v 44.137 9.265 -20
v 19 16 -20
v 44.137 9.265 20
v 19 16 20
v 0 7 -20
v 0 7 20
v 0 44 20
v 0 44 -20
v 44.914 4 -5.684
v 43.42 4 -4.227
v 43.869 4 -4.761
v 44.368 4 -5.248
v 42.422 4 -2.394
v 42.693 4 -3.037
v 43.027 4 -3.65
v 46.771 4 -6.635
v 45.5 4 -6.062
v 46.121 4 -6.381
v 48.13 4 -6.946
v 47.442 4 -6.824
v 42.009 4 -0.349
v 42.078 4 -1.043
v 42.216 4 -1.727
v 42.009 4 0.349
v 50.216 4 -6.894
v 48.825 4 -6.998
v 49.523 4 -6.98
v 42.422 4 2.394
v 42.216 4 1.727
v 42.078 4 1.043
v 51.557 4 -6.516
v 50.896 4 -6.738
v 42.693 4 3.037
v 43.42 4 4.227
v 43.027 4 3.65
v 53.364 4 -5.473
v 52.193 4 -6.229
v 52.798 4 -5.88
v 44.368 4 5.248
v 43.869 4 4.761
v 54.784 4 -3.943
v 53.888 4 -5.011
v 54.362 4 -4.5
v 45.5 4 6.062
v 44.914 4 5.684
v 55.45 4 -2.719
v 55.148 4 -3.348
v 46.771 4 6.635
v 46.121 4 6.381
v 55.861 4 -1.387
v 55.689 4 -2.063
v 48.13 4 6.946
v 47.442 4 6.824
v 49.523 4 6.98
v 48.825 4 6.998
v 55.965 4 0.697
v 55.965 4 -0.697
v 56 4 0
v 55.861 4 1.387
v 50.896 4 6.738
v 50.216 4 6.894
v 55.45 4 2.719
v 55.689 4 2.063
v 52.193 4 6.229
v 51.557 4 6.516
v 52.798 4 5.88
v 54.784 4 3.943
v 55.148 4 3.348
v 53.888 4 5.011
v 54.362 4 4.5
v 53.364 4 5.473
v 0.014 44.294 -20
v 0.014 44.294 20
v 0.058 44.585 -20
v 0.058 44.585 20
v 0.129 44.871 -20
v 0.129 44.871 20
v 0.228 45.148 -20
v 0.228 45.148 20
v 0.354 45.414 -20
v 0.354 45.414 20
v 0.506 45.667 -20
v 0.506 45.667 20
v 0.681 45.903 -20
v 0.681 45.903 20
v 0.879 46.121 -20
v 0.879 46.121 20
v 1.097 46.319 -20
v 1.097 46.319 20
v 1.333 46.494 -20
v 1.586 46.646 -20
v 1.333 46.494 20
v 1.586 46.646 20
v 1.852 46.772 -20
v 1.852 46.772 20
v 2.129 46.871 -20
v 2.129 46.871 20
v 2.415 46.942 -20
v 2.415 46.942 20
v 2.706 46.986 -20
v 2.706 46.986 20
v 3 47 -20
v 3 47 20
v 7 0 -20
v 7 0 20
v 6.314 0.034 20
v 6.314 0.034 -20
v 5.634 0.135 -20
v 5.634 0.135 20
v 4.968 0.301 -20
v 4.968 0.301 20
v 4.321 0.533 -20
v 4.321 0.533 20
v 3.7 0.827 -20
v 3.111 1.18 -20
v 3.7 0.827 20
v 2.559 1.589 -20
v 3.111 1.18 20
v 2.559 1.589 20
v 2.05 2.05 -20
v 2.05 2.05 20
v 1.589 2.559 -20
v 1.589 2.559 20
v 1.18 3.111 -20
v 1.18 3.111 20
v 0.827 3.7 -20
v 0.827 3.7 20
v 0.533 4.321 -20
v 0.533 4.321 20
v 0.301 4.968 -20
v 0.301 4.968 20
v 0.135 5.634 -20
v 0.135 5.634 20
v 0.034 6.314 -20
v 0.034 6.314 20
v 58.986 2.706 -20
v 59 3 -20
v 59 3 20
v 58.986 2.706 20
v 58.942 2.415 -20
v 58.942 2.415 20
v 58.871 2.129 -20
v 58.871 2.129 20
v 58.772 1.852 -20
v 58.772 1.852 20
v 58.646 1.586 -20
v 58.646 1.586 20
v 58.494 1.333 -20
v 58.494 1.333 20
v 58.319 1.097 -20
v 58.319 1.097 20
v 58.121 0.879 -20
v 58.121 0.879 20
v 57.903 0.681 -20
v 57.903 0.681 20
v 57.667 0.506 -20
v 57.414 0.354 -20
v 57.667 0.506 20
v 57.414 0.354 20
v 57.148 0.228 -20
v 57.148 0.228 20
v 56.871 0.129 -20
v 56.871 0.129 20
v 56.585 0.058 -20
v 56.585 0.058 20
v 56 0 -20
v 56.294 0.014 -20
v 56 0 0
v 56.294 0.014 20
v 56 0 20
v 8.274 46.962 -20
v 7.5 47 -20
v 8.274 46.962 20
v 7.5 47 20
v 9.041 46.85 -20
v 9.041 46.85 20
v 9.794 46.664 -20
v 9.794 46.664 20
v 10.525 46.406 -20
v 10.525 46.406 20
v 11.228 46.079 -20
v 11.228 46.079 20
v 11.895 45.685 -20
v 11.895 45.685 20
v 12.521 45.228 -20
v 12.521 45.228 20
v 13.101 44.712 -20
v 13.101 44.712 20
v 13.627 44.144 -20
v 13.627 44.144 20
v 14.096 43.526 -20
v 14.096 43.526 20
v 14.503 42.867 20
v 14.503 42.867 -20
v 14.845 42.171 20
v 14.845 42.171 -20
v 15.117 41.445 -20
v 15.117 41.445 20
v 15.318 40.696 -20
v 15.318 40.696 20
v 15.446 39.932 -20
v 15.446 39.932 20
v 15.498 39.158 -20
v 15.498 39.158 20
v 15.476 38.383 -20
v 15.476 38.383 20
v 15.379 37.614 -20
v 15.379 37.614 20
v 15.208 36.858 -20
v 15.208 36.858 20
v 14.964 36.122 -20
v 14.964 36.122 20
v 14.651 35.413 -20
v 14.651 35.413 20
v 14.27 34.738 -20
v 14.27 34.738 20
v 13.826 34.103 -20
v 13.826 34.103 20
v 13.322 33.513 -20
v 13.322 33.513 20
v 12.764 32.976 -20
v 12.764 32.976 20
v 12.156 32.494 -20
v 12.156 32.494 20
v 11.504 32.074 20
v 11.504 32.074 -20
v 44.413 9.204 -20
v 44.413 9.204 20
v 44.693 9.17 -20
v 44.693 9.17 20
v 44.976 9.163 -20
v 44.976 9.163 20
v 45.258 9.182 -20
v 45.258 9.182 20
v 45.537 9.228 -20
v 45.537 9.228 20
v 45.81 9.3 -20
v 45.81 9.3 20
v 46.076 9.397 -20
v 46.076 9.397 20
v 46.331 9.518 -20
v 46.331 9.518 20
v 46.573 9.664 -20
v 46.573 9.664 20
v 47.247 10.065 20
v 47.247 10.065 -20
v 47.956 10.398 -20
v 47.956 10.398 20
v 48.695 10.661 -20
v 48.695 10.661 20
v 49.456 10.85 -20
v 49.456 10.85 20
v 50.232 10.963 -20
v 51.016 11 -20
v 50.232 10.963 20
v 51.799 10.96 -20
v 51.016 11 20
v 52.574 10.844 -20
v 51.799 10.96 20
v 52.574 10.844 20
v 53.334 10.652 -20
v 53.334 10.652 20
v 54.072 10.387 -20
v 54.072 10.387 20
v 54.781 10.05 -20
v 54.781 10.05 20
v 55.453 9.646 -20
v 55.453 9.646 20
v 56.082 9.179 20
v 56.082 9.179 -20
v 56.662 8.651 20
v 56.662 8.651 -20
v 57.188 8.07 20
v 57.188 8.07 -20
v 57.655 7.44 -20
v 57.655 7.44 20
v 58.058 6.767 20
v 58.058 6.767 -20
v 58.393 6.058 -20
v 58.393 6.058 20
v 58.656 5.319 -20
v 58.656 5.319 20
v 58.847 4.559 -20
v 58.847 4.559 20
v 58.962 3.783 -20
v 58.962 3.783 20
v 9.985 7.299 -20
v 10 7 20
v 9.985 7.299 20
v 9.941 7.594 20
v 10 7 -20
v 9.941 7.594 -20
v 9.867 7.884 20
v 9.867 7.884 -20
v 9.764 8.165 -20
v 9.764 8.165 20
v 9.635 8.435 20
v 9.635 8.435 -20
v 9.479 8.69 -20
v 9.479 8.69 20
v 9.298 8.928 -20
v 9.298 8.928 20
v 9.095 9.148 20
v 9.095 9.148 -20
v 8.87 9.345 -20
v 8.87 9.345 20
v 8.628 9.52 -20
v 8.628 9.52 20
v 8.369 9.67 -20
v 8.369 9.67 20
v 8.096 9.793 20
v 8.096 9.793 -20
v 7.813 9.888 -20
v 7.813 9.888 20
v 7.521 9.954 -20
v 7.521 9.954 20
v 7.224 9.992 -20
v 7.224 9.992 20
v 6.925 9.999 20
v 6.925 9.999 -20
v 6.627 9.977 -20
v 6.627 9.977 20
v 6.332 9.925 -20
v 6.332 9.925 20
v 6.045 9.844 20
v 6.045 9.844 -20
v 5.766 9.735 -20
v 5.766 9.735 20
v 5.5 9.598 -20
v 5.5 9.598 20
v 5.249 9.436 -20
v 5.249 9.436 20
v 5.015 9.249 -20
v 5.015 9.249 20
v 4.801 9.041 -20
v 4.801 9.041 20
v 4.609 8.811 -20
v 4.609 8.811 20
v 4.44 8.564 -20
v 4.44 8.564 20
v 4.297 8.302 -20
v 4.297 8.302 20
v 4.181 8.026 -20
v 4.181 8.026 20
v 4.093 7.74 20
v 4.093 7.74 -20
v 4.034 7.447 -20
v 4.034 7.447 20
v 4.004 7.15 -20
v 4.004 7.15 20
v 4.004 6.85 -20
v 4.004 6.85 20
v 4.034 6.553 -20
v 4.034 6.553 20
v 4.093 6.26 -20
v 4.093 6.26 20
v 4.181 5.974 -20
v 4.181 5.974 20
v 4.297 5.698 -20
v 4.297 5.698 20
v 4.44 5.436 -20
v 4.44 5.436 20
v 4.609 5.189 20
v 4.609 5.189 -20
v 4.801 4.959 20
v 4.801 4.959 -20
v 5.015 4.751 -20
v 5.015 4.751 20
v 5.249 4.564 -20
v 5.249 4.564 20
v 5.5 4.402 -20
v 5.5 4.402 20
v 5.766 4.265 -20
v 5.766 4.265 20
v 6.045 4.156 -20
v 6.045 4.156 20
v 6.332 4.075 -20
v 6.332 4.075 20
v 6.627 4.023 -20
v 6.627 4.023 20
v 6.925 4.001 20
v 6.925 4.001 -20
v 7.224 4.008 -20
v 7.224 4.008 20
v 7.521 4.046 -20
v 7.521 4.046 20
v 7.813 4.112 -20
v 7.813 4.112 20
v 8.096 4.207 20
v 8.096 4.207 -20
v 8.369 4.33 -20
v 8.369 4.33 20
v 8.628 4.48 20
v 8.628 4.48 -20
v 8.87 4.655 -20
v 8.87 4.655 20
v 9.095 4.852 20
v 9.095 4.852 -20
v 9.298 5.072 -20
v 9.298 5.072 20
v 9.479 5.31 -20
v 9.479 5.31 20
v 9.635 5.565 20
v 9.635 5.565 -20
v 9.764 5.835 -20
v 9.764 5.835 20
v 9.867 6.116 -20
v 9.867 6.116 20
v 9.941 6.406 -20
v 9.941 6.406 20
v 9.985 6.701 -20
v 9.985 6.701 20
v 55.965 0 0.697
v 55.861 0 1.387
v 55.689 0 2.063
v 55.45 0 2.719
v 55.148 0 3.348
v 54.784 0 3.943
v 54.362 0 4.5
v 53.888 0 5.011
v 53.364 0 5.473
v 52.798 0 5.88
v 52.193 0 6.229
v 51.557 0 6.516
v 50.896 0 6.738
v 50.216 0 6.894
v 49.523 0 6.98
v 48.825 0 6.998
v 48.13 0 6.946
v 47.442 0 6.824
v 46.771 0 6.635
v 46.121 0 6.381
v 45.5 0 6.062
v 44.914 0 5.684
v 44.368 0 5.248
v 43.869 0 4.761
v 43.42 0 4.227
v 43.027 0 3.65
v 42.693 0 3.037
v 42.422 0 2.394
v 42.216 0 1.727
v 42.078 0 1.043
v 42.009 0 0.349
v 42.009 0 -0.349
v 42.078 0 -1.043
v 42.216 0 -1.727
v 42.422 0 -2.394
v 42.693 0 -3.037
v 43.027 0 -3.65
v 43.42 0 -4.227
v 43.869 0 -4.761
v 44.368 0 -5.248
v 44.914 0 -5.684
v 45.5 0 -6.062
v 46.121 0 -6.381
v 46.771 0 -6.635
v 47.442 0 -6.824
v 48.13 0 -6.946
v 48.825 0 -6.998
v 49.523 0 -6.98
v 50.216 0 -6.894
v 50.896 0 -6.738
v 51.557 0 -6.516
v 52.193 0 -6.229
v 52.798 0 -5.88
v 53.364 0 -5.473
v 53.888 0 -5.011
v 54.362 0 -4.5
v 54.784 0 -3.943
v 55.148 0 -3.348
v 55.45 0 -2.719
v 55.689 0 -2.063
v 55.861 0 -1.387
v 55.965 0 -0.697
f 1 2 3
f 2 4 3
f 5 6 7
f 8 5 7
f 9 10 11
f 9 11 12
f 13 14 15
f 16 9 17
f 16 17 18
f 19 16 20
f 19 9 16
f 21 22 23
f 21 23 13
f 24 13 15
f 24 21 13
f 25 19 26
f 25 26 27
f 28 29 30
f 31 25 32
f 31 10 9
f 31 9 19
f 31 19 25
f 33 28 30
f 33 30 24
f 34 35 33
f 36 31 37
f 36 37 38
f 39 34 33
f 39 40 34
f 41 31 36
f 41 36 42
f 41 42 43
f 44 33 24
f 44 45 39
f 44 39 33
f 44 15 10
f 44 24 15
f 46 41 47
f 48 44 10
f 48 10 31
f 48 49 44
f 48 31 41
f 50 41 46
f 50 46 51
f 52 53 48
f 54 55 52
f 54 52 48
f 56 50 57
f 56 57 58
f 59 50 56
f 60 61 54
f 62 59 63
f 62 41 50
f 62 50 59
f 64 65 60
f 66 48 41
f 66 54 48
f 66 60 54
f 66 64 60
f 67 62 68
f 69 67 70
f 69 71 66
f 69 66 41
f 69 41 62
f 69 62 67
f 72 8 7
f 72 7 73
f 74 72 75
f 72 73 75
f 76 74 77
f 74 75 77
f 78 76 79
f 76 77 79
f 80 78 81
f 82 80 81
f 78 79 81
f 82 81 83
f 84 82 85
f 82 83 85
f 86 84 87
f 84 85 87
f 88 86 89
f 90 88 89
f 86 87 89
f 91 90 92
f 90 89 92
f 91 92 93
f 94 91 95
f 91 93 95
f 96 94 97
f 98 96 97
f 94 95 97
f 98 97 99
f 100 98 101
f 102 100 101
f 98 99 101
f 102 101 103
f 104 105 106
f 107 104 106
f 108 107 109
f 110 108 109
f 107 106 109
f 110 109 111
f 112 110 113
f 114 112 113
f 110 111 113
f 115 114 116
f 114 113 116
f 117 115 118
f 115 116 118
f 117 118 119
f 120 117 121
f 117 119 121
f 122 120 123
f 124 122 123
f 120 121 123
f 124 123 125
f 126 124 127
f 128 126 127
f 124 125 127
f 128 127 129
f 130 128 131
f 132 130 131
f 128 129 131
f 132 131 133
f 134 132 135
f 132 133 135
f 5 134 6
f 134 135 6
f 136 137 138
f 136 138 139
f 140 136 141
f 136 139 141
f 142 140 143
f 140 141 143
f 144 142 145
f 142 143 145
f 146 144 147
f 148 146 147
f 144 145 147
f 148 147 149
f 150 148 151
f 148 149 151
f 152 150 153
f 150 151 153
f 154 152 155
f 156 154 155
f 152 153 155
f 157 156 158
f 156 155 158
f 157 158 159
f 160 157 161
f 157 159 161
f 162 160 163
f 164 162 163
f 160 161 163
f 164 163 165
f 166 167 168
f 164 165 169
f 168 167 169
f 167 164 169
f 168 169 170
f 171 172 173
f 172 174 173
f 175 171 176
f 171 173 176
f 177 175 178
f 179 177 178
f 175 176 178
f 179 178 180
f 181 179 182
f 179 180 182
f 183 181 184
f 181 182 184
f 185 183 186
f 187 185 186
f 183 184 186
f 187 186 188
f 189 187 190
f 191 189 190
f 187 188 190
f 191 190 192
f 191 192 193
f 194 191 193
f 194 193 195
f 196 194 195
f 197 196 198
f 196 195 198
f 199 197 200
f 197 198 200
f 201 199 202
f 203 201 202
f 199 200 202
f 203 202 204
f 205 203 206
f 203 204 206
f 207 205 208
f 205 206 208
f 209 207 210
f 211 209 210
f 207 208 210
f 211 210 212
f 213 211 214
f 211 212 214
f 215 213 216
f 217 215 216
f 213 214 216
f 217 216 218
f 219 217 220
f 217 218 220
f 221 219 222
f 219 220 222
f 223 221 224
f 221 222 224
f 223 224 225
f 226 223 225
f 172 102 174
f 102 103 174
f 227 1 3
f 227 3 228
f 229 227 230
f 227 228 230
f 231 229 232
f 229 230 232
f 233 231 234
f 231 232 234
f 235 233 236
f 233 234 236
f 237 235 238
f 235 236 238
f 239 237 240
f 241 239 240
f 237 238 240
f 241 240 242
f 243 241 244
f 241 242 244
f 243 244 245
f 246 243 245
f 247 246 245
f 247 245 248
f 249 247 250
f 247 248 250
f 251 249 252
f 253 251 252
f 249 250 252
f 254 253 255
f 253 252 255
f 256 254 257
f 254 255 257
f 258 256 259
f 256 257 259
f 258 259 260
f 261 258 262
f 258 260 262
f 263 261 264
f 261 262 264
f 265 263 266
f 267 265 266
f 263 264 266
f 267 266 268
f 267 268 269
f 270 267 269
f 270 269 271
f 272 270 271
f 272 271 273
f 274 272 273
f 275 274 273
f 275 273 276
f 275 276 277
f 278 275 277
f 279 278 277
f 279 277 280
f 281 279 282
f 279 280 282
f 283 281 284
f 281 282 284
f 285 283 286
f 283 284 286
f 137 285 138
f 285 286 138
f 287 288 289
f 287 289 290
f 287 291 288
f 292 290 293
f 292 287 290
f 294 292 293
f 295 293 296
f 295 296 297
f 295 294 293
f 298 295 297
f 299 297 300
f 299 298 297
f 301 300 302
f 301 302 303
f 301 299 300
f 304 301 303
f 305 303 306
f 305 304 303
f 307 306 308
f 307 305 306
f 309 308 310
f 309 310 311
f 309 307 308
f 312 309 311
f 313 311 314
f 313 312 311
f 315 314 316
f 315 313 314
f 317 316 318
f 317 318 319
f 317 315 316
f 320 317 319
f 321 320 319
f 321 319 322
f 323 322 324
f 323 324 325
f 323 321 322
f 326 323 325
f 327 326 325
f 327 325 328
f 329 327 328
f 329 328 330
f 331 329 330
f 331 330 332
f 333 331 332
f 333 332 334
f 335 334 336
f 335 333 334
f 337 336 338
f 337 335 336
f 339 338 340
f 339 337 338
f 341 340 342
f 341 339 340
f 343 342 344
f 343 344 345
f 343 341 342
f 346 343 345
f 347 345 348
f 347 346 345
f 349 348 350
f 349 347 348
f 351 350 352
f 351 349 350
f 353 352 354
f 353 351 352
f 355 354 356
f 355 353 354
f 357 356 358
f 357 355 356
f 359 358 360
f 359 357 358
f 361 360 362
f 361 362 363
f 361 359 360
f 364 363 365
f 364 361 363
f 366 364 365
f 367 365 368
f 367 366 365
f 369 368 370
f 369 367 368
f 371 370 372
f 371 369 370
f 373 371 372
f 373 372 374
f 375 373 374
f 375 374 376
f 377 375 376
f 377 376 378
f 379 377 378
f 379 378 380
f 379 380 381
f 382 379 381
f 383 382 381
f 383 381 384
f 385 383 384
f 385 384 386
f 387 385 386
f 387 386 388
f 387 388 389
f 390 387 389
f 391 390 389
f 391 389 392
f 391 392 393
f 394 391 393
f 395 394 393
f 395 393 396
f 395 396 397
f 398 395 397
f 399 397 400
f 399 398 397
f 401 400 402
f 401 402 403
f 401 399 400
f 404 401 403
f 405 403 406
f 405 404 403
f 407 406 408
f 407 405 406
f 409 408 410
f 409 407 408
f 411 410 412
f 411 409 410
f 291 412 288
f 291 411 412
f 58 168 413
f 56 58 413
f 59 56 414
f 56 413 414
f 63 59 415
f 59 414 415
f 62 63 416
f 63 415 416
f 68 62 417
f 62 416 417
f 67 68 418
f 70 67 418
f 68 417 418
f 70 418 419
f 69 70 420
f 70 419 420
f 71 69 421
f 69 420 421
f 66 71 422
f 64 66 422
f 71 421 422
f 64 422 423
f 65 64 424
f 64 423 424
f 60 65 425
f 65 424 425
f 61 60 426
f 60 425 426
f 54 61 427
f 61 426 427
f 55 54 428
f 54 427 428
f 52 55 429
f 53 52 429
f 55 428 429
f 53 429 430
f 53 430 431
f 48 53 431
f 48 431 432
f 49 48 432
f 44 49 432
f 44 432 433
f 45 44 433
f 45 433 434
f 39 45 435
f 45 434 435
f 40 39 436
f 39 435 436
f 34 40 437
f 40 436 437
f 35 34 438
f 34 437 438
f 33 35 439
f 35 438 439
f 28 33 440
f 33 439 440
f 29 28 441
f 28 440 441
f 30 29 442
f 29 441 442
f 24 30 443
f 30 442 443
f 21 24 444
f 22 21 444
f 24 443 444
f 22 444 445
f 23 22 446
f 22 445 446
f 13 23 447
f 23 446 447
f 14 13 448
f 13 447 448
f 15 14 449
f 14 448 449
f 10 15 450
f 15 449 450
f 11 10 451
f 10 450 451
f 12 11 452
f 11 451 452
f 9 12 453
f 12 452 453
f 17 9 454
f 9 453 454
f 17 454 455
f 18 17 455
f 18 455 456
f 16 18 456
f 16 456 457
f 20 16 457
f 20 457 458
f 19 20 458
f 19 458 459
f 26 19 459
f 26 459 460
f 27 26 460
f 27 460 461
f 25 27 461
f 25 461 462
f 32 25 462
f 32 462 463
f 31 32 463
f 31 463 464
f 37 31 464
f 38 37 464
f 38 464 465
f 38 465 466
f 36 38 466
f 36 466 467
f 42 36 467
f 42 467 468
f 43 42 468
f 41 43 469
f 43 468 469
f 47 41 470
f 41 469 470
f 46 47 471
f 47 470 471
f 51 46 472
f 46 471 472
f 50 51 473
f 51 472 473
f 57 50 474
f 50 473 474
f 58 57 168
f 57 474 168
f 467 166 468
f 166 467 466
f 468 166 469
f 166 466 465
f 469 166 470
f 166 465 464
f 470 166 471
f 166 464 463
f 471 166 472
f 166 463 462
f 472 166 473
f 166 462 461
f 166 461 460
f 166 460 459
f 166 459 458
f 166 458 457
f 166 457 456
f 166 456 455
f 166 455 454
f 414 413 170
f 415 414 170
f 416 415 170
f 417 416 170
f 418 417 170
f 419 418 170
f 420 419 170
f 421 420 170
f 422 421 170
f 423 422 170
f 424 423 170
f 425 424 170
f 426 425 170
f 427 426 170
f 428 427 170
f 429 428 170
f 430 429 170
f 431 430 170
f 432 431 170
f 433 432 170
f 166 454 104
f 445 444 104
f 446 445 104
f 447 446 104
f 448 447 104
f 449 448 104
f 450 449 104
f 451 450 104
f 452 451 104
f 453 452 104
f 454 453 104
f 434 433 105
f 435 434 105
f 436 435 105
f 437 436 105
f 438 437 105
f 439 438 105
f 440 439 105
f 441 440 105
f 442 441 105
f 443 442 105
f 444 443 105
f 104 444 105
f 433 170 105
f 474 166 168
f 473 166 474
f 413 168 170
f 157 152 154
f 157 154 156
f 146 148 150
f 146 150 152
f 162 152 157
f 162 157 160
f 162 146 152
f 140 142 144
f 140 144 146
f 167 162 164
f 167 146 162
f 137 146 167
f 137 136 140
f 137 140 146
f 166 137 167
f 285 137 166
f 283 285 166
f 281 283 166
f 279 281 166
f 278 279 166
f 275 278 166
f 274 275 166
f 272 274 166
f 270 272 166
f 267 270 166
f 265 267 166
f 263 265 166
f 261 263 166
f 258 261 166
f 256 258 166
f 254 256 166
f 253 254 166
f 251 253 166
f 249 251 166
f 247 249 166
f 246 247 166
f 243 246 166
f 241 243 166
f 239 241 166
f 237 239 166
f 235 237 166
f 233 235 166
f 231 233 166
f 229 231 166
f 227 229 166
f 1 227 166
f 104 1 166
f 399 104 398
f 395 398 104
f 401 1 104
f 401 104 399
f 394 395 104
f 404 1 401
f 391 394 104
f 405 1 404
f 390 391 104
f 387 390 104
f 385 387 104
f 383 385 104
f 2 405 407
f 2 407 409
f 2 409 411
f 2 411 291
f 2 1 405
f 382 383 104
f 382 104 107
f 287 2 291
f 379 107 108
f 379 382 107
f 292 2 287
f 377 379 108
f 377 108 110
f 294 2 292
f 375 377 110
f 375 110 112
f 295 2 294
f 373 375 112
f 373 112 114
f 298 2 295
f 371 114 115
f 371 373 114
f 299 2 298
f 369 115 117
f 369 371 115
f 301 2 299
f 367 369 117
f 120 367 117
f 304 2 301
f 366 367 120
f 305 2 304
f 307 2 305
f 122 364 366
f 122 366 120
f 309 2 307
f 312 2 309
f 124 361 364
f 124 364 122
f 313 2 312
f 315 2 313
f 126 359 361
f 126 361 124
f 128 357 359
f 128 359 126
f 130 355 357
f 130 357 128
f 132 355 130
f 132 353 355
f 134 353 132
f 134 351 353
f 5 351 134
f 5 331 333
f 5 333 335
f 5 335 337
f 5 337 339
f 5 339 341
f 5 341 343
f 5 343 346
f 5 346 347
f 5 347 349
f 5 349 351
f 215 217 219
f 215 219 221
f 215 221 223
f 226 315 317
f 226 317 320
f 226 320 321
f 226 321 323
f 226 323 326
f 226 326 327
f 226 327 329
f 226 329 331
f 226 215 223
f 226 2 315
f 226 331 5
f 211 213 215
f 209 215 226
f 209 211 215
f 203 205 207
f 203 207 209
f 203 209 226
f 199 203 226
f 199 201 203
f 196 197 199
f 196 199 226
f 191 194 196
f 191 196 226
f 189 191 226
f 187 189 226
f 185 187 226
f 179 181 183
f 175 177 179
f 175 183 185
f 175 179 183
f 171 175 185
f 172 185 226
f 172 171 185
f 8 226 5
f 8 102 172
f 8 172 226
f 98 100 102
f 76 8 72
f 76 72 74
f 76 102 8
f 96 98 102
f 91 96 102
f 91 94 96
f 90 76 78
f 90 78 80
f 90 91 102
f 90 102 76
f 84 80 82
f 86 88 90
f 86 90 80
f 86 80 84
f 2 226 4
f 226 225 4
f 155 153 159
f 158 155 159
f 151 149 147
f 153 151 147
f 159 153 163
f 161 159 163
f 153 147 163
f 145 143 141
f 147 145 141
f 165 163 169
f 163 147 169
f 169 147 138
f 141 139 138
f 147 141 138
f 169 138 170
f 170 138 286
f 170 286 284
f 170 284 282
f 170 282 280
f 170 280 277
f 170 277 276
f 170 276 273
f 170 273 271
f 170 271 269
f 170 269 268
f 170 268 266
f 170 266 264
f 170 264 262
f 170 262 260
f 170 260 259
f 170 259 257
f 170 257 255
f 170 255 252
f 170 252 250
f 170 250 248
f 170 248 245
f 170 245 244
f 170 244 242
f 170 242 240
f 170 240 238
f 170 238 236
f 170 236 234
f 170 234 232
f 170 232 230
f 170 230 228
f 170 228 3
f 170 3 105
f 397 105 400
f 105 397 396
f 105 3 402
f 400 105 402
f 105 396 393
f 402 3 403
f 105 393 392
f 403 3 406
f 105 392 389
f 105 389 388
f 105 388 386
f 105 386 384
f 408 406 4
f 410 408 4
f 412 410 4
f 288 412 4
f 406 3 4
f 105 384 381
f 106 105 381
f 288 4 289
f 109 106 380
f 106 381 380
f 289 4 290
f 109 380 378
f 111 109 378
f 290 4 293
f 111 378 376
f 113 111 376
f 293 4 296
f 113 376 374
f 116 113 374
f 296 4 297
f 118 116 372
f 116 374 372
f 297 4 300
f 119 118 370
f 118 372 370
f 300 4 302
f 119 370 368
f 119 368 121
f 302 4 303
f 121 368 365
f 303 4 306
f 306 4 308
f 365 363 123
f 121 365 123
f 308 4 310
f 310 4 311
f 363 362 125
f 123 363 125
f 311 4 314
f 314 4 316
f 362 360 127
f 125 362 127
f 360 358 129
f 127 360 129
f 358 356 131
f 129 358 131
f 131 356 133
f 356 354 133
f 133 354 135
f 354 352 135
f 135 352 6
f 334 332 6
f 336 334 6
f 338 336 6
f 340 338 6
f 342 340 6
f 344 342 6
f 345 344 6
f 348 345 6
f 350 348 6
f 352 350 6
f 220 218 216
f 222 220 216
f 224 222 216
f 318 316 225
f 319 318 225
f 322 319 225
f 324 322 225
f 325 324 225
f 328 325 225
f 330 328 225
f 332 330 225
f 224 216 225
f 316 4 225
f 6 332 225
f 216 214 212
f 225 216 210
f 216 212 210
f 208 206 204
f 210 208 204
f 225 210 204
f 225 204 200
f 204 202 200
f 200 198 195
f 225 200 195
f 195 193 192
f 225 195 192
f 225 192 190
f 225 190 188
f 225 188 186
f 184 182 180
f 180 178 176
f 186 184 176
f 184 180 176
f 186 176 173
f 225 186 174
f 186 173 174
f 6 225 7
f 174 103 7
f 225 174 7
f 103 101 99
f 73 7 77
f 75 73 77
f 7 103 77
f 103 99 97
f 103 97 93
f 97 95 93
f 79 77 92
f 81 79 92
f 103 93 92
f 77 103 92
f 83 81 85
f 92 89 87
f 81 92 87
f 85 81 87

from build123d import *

# Parameters (mm, degrees)
SKETCH_1_R          = 3
EXTRUDE_1_DEPTH     = 20
SKETCH_2_R          = 7
CUT_EXTRUDE_1_DEPTH = 4


with BuildPart() as part:
    # 스케치1 → 보스-돌출1 (new body, symmetric)
    with BuildSketch(Plane.XY):
        with BuildLine():
            Line((0, 7), (0, 44))
            ThreePointArc((0, 44), (0.878679656, 46.121320344), (3, 47))
            Line((3, 47), (7.5, 47))
            ThreePointArc((7.5, 47), (15.226747122, 41.07301204), (11.504409953, 32.074344729))
            Line((11.504409953, 32.074344729), (19, 16))
            Line((19, 16), (44.136675312, 9.26464815))
            ThreePointArc((44.136675312, 9.26464815), (45.397872906, 9.201846853), (46.573187235, 9.663582275))
            ThreePointArc((46.573187235, 9.663582275), (54.780575213, 10.050336947), (59, 3))
            ThreePointArc((59, 3), (58.121320344, 0.878679656), (56, 0))
            Line((56, 0), (7, 0))
            ThreePointArc((7, 0), (2.050252532, 2.050252532), (0, 7))
        make_face()
        with Locations((7, 7)):
            Circle(SKETCH_1_R, mode=Mode.SUBTRACT)
    extrude(amount=EXTRUDE_1_DEPTH, both=True)

    # 스케치2 → 컷-돌출1 (cut)
    with BuildSketch(Plane.XZ):
        with Locations((49, 0)):
            Circle(SKETCH_2_R)
    extrude(amount=-CUT_EXTRUDE_1_DEPTH, mode=Mode.SUBTRACT)


solid = part.part
